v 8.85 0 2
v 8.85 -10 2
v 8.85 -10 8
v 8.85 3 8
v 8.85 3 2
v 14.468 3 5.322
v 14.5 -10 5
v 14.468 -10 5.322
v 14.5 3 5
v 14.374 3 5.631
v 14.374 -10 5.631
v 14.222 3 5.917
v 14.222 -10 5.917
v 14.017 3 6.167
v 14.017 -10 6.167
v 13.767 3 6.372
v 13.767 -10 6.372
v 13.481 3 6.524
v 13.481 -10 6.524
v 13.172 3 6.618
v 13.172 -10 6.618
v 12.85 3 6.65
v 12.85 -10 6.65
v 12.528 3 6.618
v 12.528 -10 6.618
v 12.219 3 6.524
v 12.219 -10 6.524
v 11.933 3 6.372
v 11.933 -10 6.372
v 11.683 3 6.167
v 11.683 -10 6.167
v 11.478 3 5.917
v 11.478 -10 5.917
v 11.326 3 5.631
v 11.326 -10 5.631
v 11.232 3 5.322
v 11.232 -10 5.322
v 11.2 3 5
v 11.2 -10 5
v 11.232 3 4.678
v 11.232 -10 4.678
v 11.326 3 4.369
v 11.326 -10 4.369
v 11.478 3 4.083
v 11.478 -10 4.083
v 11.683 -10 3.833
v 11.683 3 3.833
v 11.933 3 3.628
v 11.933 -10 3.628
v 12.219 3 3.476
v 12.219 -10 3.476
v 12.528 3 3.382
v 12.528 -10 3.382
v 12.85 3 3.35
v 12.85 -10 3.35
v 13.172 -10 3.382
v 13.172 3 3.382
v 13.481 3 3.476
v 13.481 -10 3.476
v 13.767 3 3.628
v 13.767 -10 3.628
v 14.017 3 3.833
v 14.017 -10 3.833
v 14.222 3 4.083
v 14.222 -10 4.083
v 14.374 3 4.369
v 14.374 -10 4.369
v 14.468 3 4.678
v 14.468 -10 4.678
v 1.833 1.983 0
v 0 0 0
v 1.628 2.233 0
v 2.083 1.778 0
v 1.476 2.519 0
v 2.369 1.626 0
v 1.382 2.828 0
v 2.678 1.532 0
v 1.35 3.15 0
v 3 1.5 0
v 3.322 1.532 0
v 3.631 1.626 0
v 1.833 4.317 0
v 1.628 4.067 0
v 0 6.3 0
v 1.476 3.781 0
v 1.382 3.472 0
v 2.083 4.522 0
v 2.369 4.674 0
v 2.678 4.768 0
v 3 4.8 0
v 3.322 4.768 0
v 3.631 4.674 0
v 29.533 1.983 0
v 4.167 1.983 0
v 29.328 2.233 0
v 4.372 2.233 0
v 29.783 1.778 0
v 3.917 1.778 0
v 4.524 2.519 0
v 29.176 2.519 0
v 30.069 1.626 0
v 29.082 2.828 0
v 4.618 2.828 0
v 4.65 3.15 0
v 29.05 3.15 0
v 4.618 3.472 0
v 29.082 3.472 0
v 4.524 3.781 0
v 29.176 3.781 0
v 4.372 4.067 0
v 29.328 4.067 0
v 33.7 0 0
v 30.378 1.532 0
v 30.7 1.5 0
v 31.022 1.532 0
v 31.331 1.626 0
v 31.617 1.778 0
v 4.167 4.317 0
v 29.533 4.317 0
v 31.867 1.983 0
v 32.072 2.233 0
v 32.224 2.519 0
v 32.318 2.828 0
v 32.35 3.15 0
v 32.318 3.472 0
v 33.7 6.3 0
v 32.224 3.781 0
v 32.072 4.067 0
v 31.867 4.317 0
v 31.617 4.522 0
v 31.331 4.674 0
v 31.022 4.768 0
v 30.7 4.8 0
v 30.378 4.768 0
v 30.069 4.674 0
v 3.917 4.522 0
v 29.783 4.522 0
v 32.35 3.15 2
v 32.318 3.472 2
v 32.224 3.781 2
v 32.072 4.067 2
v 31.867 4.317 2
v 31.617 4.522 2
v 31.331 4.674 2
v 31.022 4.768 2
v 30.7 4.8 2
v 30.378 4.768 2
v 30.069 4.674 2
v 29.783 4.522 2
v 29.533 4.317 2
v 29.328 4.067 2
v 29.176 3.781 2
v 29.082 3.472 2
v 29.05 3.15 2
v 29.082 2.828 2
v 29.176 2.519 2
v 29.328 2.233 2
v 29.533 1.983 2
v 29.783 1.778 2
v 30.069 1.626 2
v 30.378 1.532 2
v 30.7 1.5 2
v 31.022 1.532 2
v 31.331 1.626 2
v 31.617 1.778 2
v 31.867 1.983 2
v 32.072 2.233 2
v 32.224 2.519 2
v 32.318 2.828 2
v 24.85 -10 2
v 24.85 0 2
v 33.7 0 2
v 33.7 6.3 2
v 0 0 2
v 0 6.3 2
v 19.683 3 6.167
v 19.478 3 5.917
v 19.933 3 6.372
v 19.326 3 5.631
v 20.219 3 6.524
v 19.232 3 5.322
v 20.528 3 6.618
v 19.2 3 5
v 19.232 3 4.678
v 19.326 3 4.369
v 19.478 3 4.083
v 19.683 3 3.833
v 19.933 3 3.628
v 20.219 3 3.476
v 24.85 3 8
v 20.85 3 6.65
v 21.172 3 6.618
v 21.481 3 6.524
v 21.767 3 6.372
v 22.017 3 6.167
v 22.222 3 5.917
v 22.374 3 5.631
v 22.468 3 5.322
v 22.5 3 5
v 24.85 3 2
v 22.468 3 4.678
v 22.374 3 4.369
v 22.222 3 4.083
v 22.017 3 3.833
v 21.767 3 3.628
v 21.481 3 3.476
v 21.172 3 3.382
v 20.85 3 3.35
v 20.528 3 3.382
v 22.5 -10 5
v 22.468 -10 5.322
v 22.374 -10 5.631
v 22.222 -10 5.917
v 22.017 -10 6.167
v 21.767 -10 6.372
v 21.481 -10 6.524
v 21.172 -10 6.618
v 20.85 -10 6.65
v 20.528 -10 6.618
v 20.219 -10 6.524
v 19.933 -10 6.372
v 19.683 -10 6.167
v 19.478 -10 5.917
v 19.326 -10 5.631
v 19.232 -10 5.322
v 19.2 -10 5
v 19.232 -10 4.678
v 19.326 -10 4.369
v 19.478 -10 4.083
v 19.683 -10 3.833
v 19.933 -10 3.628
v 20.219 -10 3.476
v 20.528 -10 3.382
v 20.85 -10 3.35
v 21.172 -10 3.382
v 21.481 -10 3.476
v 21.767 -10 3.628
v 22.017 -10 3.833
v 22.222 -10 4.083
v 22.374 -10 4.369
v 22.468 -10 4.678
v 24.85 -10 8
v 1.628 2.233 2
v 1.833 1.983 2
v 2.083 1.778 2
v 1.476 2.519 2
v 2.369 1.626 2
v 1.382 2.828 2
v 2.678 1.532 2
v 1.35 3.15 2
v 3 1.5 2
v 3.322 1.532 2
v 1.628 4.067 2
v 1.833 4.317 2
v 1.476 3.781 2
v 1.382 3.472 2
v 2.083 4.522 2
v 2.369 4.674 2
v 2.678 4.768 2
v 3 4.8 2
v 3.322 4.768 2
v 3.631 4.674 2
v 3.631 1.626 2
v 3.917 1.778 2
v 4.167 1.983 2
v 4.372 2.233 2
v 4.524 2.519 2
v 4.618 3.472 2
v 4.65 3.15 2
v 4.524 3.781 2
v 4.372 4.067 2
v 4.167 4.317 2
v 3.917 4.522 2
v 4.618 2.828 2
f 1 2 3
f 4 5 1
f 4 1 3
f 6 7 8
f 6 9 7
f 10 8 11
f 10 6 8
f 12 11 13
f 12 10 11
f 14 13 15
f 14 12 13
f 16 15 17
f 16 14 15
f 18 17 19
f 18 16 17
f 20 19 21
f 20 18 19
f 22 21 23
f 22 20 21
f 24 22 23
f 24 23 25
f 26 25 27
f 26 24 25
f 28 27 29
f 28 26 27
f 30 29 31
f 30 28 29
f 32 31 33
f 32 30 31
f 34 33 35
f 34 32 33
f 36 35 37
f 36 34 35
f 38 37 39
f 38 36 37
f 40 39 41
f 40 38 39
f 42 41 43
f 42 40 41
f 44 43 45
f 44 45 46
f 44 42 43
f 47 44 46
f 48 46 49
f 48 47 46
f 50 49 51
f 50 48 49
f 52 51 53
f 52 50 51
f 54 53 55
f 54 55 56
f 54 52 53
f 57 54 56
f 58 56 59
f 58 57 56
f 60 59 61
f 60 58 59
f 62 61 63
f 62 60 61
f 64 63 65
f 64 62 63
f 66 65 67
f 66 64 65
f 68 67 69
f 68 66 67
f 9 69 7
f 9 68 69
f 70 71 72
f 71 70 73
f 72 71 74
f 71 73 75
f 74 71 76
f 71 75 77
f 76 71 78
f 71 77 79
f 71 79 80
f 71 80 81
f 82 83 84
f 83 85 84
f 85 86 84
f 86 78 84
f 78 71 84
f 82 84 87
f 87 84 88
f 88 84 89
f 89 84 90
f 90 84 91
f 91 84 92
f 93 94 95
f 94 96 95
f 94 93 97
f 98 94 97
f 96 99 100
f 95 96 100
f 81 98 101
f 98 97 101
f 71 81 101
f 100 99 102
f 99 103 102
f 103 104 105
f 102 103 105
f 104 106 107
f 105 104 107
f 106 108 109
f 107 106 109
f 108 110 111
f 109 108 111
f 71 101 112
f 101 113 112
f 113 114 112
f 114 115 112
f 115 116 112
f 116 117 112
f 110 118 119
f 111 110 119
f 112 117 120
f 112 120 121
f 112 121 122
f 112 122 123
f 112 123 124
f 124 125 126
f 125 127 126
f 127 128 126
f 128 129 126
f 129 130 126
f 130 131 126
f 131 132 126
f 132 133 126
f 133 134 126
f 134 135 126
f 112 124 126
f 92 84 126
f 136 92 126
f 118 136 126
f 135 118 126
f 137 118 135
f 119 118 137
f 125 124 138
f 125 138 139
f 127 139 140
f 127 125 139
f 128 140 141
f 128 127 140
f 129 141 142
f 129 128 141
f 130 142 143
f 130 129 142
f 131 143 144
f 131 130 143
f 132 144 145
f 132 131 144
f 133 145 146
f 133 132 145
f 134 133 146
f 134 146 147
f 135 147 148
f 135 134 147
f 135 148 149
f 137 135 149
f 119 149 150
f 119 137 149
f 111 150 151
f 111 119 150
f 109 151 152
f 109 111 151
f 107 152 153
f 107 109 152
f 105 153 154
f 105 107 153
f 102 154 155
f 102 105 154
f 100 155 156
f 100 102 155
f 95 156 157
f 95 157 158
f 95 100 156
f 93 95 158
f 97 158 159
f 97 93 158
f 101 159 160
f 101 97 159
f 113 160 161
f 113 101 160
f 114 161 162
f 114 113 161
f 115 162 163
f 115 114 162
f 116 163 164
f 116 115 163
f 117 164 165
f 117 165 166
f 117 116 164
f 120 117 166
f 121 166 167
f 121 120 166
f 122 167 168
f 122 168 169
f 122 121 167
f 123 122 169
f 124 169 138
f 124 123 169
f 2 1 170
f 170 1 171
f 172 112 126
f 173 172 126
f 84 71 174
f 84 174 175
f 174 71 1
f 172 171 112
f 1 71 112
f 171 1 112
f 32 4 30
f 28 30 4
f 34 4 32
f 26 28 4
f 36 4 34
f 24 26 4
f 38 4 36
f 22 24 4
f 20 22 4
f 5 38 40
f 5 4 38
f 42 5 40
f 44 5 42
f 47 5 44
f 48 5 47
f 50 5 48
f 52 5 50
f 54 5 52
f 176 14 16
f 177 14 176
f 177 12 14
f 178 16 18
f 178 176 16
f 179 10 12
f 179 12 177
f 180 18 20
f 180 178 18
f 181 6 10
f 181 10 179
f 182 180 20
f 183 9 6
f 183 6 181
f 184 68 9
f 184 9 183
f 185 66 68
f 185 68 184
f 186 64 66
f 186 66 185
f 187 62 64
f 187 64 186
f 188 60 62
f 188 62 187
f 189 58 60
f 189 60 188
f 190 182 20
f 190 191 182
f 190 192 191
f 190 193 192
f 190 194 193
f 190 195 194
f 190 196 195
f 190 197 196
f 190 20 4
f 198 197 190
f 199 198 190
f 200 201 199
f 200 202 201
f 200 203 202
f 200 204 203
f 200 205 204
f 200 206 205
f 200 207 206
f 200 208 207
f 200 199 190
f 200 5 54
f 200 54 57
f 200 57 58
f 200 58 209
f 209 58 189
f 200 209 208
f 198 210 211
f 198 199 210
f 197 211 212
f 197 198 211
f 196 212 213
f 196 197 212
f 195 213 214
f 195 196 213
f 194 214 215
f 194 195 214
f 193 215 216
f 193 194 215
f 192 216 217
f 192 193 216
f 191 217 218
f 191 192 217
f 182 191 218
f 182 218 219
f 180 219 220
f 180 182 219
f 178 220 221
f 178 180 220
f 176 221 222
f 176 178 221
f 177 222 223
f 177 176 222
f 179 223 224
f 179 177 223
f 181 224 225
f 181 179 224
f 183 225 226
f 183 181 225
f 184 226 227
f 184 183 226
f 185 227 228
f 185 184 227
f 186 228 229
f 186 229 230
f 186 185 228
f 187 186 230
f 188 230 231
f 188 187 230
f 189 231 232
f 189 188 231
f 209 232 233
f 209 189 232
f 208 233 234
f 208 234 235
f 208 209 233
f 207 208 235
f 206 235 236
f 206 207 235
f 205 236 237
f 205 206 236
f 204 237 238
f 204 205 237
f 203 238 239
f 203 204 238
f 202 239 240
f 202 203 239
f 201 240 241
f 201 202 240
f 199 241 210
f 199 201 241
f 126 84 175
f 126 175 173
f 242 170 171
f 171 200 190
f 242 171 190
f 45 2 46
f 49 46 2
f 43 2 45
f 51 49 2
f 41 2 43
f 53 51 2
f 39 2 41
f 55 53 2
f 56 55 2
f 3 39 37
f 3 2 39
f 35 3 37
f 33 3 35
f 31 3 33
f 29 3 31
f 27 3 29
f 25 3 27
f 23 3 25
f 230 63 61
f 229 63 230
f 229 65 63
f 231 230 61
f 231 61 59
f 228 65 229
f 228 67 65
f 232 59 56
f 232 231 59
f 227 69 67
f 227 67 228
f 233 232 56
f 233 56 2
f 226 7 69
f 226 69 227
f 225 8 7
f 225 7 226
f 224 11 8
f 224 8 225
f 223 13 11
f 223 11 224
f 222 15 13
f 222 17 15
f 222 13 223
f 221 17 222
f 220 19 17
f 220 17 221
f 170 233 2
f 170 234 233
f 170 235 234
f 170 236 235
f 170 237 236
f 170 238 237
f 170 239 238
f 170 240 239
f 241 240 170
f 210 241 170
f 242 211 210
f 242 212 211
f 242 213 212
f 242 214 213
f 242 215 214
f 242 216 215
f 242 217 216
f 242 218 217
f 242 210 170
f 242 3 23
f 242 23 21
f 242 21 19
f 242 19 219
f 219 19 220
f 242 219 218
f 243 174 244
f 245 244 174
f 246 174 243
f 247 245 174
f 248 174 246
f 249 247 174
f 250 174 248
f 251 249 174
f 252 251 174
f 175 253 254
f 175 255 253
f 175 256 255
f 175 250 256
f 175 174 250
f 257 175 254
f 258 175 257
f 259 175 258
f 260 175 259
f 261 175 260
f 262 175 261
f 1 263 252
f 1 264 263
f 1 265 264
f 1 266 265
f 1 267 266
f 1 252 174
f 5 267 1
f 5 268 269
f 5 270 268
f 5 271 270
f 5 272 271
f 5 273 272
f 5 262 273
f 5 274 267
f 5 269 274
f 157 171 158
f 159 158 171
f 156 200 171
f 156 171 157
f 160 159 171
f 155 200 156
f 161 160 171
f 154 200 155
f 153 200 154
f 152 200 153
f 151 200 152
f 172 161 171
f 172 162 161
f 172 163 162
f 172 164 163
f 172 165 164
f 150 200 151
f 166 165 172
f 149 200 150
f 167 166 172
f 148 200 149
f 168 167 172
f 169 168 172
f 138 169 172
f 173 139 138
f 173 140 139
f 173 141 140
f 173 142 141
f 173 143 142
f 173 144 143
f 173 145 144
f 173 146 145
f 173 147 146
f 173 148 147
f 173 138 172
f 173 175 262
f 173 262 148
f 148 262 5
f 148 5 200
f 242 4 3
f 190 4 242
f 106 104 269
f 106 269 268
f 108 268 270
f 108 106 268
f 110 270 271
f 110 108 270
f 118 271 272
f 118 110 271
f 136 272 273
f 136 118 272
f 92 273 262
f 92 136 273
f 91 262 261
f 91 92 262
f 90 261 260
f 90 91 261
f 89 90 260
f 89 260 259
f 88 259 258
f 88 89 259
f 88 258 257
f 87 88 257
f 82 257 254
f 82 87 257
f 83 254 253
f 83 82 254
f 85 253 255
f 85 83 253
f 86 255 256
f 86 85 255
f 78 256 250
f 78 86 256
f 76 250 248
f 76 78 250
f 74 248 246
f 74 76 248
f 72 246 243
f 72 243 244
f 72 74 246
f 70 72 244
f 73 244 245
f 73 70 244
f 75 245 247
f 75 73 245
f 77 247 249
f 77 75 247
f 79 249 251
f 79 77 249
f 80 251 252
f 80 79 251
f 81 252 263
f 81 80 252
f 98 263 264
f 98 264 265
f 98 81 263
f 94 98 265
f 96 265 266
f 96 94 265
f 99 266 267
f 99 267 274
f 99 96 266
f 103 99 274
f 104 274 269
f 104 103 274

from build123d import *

# Parameters (mm, degrees)
SKETCH1_W           = 33.7
SKETCH1_H           = 6.3
SKETCH1_R           = 1.65
BOSS_EXTRUDE1_DEPTH = 2
SKETCH2_W           = 16
SKETCH2_H           = 3
BOSS_EXTRUDE2_DEPTH = 6
SKETCH3_R           = 1.65
CUT_EXTRUDE1_DEPTH  = 6
SKETCH4_W           = 16
SKETCH4_H           = 6
SKETCH4_R           = 1.65
BOSS_EXTRUDE3_DEPTH = 10


with BuildPart() as part:
    # Sketch1 → Boss-Extrude1 (new body)
    with BuildSketch(Plane.XY):
        with Locations((16.85, 3.15)):
            Rectangle(SKETCH1_W, SKETCH1_H)
        with Locations((3, 3.15)):
            Circle(SKETCH1_R, mode=Mode.SUBTRACT)
        with Locations((30.7, 3.15)):
            Circle(SKETCH1_R, mode=Mode.SUBTRACT)
    extrude(amount=BOSS_EXTRUDE1_DEPTH)

    # Sketch2 → Boss-Extrude2 (add)
    with BuildSketch(Plane.XY.offset(2)):
        with Locations((16.85, 1.5)):
            Rectangle(SKETCH2_W, SKETCH2_H)
    extrude(amount=BOSS_EXTRUDE2_DEPTH)

    # Sketch3 → Cut-Extrude1 (cut)
    with BuildSketch(Plane(origin=(0, 3, 0), x_dir=(1, 0, 0), z_dir=(0, 1, 0))):
        with Locations((12.85, -5)):
            Circle(SKETCH3_R)
        with Locations((20.85, -5)):
            Circle(SKETCH3_R)
    extrude(amount=-CUT_EXTRUDE1_DEPTH, mode=Mode.SUBTRACT)

    # Sketch4 → Boss-Extrude3 (add)
    with BuildSketch(Plane.XZ):
        with Locations((16.85, 5)):
            Rectangle(SKETCH4_W, SKETCH4_H)
        with Locations((12.85, 5)):
            Circle(SKETCH4_R, mode=Mode.SUBTRACT)
        with Locations((20.85, 5)):
            Circle(SKETCH4_R, mode=Mode.SUBTRACT)
    extrude(amount=BOSS_EXTRUDE3_DEPTH)


solid = part.part
